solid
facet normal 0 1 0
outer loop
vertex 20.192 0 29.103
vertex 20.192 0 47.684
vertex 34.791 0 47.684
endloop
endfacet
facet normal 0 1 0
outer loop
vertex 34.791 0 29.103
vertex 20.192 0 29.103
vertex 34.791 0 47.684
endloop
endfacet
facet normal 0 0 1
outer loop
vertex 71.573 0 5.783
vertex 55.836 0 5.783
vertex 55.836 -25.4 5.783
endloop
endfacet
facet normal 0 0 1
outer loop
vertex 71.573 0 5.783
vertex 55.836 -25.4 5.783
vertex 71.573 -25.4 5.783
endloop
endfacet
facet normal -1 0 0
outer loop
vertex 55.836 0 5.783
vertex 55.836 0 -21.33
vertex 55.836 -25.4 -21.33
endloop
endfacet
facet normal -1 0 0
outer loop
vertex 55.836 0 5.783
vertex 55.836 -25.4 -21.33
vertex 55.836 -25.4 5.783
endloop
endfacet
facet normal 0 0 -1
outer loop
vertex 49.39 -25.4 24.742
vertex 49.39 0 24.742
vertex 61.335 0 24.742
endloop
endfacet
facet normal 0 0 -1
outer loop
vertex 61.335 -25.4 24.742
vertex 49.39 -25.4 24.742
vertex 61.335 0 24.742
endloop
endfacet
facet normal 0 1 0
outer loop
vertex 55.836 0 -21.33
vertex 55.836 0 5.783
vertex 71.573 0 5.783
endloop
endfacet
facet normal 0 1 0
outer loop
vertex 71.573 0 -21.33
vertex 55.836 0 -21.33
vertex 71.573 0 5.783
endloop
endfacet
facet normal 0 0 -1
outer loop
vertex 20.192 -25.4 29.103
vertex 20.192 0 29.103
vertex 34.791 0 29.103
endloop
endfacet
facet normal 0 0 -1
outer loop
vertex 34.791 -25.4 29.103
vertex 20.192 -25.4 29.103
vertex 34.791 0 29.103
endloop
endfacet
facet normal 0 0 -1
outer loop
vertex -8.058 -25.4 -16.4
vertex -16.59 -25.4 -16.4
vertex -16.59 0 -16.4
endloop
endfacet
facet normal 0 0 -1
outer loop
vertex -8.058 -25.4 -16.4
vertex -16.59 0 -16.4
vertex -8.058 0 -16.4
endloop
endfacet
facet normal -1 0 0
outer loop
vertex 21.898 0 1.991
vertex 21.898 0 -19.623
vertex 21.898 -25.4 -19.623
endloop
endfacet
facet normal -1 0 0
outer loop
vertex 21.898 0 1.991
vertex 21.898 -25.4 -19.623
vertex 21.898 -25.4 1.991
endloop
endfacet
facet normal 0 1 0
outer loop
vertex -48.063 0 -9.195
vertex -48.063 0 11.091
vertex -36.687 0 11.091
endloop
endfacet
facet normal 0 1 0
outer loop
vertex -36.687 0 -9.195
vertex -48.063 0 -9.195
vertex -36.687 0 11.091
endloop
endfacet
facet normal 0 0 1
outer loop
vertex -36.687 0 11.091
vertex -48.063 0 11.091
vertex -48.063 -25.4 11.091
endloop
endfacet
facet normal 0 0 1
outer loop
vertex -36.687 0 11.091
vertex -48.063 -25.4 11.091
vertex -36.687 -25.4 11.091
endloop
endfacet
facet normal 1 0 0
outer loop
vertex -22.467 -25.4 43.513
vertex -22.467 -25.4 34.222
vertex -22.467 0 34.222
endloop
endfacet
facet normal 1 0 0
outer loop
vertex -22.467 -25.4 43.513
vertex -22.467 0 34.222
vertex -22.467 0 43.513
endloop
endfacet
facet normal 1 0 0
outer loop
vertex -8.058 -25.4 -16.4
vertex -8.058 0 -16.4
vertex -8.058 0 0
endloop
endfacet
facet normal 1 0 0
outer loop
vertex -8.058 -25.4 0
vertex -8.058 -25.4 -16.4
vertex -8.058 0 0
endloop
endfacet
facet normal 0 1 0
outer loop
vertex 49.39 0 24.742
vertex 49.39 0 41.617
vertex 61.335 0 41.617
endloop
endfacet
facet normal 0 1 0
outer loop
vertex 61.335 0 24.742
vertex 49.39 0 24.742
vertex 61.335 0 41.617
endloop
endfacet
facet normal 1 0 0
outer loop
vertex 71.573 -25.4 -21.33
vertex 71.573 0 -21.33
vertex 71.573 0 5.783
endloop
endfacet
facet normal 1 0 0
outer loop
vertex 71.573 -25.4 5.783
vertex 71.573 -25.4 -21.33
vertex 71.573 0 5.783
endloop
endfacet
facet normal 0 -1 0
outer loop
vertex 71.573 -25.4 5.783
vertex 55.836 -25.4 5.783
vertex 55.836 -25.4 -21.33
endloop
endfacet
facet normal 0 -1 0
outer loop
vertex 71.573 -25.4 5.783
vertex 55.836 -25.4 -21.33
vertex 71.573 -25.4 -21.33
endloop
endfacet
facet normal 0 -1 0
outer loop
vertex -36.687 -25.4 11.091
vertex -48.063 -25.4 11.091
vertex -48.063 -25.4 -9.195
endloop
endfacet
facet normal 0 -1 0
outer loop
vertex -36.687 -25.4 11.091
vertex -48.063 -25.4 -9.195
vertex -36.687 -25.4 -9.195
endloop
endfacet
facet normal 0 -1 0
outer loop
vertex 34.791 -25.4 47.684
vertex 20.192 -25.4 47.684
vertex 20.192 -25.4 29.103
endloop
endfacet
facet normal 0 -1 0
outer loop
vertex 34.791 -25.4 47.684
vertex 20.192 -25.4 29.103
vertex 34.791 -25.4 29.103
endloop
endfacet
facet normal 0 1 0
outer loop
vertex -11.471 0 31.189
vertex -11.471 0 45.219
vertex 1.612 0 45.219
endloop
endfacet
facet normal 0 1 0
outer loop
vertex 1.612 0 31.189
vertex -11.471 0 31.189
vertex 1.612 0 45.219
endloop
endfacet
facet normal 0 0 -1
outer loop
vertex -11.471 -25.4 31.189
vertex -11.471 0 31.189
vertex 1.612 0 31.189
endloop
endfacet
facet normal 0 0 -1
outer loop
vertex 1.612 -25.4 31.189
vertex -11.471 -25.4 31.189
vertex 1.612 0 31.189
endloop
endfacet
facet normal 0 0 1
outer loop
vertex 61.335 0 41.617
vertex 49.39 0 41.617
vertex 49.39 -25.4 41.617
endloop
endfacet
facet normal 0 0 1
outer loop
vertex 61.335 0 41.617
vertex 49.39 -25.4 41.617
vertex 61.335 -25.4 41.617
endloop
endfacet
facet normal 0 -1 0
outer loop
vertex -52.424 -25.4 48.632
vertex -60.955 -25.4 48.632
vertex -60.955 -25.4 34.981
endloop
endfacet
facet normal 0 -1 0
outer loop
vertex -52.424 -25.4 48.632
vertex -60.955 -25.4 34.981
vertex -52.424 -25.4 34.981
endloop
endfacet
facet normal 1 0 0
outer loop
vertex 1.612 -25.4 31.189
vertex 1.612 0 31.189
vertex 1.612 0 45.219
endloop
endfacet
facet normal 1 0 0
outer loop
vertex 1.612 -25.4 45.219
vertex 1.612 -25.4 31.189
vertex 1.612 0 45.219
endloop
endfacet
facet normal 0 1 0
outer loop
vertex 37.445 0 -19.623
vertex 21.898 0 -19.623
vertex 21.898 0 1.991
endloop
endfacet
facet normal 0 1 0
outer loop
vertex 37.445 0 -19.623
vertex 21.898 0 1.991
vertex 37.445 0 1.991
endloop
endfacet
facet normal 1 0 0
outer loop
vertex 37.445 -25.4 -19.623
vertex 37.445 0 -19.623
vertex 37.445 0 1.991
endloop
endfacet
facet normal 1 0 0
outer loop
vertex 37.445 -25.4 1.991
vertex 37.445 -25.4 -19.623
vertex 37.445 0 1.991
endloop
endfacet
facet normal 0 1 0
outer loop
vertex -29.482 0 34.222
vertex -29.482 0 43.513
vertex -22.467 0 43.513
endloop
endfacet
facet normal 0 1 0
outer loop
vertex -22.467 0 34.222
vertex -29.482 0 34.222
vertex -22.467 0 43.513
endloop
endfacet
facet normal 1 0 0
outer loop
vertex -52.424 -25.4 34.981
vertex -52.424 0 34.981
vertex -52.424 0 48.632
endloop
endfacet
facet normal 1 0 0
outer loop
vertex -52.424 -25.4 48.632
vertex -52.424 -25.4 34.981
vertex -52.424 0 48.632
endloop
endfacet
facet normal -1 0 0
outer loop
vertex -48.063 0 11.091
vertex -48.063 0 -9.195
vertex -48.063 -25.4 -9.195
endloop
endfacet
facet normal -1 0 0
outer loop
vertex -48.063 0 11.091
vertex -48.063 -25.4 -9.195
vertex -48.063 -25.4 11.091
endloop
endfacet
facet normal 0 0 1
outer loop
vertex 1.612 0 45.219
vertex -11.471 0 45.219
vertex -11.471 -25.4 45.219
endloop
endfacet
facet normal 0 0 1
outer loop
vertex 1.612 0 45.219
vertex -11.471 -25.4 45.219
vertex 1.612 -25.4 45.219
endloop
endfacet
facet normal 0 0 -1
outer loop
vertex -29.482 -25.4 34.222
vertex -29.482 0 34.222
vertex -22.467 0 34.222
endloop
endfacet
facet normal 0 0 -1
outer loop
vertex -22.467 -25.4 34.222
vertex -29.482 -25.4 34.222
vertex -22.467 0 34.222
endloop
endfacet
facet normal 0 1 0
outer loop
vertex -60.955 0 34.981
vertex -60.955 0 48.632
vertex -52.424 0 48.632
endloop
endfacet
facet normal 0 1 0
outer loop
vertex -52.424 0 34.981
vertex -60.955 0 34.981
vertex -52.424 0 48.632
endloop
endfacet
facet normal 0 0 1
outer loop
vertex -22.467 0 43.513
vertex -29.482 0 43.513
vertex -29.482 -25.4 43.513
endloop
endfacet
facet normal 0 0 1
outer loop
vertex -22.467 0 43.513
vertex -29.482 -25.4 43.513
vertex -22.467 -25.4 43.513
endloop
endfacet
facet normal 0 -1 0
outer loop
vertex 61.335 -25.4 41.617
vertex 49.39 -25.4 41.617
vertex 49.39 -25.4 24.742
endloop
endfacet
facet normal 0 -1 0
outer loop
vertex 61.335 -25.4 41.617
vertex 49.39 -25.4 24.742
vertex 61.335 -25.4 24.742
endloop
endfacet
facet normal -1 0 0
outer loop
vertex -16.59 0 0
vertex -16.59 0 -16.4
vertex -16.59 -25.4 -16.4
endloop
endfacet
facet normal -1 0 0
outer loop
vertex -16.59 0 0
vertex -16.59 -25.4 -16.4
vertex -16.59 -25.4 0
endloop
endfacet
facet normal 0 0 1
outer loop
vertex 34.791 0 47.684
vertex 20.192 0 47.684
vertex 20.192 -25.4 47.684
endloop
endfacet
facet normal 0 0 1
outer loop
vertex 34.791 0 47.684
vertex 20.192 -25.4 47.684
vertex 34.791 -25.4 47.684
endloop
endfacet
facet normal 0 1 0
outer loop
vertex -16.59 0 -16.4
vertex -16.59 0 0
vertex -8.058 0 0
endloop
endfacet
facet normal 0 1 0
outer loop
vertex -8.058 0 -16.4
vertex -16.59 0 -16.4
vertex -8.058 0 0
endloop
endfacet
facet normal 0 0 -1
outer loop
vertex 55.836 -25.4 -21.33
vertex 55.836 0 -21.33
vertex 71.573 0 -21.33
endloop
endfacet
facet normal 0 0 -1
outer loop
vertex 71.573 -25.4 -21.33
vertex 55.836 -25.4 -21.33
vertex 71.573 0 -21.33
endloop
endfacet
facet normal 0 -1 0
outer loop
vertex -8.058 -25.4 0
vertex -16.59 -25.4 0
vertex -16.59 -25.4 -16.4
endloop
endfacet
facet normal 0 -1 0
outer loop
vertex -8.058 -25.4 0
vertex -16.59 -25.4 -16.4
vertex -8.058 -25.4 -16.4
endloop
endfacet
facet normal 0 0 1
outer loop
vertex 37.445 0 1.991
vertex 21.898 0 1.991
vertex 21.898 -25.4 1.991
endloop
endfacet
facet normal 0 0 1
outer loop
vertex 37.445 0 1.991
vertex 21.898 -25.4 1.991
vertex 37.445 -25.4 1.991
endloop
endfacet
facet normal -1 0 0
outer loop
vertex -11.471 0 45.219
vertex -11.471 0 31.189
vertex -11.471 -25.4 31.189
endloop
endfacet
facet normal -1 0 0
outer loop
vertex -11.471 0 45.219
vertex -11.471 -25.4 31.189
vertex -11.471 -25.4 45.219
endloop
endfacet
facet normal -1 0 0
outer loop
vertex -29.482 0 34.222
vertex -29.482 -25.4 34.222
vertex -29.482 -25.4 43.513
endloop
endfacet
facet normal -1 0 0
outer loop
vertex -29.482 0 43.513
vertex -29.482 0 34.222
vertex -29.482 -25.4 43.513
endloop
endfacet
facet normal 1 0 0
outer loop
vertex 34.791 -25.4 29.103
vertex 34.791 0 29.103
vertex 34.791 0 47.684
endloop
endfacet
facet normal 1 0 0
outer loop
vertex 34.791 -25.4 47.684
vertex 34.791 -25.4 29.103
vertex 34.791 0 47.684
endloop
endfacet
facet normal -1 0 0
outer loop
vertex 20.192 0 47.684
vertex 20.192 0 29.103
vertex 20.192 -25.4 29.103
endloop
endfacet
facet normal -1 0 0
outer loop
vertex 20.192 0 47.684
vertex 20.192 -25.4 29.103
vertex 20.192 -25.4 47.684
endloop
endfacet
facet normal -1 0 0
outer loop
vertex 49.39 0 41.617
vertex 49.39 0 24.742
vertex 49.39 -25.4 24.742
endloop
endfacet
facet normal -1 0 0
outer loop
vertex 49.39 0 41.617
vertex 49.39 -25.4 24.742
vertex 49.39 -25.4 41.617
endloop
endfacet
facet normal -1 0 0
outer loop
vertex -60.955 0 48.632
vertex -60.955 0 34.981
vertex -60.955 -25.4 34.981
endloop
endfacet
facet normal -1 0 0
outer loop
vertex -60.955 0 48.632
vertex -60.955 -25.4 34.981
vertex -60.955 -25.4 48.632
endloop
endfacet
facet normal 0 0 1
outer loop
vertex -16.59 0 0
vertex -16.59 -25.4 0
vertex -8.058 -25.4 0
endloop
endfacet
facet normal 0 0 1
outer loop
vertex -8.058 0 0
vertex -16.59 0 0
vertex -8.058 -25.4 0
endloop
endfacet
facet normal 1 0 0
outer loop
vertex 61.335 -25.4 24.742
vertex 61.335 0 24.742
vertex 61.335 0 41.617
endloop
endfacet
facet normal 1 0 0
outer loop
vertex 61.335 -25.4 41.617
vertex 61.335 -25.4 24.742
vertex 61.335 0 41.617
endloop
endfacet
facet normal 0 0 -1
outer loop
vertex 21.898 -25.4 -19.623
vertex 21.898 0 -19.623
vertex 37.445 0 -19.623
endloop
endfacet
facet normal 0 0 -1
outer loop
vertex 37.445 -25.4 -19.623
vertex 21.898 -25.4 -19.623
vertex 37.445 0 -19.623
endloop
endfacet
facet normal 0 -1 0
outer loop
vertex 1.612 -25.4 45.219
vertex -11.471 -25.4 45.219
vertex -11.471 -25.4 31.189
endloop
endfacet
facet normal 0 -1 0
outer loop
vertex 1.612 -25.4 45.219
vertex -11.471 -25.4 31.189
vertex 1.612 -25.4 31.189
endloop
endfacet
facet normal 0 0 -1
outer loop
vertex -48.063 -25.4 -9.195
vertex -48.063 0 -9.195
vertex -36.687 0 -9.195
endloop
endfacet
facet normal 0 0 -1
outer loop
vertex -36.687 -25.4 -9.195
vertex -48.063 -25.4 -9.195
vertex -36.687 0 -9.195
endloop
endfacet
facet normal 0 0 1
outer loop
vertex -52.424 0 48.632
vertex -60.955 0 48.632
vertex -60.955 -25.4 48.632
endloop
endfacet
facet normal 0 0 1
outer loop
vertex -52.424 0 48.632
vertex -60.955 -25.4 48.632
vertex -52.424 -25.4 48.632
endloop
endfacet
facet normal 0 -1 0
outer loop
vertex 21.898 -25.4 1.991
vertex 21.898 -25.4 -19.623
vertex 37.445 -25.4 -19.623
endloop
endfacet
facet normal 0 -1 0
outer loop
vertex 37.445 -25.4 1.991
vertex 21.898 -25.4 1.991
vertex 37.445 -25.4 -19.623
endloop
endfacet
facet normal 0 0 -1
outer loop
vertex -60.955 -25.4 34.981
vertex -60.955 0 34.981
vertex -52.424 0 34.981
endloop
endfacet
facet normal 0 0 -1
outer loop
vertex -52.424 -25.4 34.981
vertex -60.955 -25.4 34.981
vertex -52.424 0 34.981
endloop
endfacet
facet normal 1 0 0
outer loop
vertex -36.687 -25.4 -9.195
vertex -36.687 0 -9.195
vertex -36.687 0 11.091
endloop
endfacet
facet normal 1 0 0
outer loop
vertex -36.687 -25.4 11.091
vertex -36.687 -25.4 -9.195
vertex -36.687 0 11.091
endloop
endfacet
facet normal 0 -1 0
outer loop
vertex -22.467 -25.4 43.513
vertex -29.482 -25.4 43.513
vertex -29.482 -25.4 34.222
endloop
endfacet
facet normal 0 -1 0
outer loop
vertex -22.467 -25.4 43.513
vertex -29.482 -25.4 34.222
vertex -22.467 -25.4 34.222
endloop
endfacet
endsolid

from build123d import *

# Parameters (mm, degrees)
F0_W     = 8.531872
F0_H     = 13.650995
F0_W_2   = 7.015096
F0_H_2   = 9.290263
F0_W_3   = 13.082204
F0_H_3   = 14.03019
F0_W_4   = 14.598982
F0_H_4   = 18.580522
F0_W_5   = 11.944618
F0_H_5   = 16.874148
F0_W_6   = 11.37583
F0_H_6   = 20.286895
F0_H_7   = 16.400155
F0_W_7   = 15.546966
F0_H_8   = 21.614076
F0_W_8   = 15.736565
F0_H_9   = 27.112393
F1_DEPTH = 25.4


with BuildPart() as f1:
    # F0 (on Front) → F1 (new body)
    with BuildSketch(Plane.XZ):
        with Locations((-56.689551, 41.806174)):
            Rectangle(F0_W, F0_H)
        with Locations((-25.974811, 38.867418)):
            Rectangle(F0_W_2, F0_H_2)
        with Locations((-4.929526, 38.203827)):
            Rectangle(F0_W_3, F0_H_3)
        with Locations((27.491587, 38.393425)):
            Rectangle(F0_W_4, F0_H_4)
        with Locations((55.362368, 33.179504)):
            Rectangle(F0_W_5, F0_H_5)
        with Locations((-42.374965, 0.947986)):
            Rectangle(F0_W_6, F0_H_6)
        with Locations((-12.323815, -8.200077)):
            Rectangle(F0_W, F0_H_7)
        with Locations((29.671954, -8.816268)):
            Rectangle(F0_W_7, F0_H_8)
        with Locations((63.704648, -7.773484)):
            Rectangle(F0_W_8, F0_H_9)
    extrude(amount=F1_DEPTH)


solid = f1.part
